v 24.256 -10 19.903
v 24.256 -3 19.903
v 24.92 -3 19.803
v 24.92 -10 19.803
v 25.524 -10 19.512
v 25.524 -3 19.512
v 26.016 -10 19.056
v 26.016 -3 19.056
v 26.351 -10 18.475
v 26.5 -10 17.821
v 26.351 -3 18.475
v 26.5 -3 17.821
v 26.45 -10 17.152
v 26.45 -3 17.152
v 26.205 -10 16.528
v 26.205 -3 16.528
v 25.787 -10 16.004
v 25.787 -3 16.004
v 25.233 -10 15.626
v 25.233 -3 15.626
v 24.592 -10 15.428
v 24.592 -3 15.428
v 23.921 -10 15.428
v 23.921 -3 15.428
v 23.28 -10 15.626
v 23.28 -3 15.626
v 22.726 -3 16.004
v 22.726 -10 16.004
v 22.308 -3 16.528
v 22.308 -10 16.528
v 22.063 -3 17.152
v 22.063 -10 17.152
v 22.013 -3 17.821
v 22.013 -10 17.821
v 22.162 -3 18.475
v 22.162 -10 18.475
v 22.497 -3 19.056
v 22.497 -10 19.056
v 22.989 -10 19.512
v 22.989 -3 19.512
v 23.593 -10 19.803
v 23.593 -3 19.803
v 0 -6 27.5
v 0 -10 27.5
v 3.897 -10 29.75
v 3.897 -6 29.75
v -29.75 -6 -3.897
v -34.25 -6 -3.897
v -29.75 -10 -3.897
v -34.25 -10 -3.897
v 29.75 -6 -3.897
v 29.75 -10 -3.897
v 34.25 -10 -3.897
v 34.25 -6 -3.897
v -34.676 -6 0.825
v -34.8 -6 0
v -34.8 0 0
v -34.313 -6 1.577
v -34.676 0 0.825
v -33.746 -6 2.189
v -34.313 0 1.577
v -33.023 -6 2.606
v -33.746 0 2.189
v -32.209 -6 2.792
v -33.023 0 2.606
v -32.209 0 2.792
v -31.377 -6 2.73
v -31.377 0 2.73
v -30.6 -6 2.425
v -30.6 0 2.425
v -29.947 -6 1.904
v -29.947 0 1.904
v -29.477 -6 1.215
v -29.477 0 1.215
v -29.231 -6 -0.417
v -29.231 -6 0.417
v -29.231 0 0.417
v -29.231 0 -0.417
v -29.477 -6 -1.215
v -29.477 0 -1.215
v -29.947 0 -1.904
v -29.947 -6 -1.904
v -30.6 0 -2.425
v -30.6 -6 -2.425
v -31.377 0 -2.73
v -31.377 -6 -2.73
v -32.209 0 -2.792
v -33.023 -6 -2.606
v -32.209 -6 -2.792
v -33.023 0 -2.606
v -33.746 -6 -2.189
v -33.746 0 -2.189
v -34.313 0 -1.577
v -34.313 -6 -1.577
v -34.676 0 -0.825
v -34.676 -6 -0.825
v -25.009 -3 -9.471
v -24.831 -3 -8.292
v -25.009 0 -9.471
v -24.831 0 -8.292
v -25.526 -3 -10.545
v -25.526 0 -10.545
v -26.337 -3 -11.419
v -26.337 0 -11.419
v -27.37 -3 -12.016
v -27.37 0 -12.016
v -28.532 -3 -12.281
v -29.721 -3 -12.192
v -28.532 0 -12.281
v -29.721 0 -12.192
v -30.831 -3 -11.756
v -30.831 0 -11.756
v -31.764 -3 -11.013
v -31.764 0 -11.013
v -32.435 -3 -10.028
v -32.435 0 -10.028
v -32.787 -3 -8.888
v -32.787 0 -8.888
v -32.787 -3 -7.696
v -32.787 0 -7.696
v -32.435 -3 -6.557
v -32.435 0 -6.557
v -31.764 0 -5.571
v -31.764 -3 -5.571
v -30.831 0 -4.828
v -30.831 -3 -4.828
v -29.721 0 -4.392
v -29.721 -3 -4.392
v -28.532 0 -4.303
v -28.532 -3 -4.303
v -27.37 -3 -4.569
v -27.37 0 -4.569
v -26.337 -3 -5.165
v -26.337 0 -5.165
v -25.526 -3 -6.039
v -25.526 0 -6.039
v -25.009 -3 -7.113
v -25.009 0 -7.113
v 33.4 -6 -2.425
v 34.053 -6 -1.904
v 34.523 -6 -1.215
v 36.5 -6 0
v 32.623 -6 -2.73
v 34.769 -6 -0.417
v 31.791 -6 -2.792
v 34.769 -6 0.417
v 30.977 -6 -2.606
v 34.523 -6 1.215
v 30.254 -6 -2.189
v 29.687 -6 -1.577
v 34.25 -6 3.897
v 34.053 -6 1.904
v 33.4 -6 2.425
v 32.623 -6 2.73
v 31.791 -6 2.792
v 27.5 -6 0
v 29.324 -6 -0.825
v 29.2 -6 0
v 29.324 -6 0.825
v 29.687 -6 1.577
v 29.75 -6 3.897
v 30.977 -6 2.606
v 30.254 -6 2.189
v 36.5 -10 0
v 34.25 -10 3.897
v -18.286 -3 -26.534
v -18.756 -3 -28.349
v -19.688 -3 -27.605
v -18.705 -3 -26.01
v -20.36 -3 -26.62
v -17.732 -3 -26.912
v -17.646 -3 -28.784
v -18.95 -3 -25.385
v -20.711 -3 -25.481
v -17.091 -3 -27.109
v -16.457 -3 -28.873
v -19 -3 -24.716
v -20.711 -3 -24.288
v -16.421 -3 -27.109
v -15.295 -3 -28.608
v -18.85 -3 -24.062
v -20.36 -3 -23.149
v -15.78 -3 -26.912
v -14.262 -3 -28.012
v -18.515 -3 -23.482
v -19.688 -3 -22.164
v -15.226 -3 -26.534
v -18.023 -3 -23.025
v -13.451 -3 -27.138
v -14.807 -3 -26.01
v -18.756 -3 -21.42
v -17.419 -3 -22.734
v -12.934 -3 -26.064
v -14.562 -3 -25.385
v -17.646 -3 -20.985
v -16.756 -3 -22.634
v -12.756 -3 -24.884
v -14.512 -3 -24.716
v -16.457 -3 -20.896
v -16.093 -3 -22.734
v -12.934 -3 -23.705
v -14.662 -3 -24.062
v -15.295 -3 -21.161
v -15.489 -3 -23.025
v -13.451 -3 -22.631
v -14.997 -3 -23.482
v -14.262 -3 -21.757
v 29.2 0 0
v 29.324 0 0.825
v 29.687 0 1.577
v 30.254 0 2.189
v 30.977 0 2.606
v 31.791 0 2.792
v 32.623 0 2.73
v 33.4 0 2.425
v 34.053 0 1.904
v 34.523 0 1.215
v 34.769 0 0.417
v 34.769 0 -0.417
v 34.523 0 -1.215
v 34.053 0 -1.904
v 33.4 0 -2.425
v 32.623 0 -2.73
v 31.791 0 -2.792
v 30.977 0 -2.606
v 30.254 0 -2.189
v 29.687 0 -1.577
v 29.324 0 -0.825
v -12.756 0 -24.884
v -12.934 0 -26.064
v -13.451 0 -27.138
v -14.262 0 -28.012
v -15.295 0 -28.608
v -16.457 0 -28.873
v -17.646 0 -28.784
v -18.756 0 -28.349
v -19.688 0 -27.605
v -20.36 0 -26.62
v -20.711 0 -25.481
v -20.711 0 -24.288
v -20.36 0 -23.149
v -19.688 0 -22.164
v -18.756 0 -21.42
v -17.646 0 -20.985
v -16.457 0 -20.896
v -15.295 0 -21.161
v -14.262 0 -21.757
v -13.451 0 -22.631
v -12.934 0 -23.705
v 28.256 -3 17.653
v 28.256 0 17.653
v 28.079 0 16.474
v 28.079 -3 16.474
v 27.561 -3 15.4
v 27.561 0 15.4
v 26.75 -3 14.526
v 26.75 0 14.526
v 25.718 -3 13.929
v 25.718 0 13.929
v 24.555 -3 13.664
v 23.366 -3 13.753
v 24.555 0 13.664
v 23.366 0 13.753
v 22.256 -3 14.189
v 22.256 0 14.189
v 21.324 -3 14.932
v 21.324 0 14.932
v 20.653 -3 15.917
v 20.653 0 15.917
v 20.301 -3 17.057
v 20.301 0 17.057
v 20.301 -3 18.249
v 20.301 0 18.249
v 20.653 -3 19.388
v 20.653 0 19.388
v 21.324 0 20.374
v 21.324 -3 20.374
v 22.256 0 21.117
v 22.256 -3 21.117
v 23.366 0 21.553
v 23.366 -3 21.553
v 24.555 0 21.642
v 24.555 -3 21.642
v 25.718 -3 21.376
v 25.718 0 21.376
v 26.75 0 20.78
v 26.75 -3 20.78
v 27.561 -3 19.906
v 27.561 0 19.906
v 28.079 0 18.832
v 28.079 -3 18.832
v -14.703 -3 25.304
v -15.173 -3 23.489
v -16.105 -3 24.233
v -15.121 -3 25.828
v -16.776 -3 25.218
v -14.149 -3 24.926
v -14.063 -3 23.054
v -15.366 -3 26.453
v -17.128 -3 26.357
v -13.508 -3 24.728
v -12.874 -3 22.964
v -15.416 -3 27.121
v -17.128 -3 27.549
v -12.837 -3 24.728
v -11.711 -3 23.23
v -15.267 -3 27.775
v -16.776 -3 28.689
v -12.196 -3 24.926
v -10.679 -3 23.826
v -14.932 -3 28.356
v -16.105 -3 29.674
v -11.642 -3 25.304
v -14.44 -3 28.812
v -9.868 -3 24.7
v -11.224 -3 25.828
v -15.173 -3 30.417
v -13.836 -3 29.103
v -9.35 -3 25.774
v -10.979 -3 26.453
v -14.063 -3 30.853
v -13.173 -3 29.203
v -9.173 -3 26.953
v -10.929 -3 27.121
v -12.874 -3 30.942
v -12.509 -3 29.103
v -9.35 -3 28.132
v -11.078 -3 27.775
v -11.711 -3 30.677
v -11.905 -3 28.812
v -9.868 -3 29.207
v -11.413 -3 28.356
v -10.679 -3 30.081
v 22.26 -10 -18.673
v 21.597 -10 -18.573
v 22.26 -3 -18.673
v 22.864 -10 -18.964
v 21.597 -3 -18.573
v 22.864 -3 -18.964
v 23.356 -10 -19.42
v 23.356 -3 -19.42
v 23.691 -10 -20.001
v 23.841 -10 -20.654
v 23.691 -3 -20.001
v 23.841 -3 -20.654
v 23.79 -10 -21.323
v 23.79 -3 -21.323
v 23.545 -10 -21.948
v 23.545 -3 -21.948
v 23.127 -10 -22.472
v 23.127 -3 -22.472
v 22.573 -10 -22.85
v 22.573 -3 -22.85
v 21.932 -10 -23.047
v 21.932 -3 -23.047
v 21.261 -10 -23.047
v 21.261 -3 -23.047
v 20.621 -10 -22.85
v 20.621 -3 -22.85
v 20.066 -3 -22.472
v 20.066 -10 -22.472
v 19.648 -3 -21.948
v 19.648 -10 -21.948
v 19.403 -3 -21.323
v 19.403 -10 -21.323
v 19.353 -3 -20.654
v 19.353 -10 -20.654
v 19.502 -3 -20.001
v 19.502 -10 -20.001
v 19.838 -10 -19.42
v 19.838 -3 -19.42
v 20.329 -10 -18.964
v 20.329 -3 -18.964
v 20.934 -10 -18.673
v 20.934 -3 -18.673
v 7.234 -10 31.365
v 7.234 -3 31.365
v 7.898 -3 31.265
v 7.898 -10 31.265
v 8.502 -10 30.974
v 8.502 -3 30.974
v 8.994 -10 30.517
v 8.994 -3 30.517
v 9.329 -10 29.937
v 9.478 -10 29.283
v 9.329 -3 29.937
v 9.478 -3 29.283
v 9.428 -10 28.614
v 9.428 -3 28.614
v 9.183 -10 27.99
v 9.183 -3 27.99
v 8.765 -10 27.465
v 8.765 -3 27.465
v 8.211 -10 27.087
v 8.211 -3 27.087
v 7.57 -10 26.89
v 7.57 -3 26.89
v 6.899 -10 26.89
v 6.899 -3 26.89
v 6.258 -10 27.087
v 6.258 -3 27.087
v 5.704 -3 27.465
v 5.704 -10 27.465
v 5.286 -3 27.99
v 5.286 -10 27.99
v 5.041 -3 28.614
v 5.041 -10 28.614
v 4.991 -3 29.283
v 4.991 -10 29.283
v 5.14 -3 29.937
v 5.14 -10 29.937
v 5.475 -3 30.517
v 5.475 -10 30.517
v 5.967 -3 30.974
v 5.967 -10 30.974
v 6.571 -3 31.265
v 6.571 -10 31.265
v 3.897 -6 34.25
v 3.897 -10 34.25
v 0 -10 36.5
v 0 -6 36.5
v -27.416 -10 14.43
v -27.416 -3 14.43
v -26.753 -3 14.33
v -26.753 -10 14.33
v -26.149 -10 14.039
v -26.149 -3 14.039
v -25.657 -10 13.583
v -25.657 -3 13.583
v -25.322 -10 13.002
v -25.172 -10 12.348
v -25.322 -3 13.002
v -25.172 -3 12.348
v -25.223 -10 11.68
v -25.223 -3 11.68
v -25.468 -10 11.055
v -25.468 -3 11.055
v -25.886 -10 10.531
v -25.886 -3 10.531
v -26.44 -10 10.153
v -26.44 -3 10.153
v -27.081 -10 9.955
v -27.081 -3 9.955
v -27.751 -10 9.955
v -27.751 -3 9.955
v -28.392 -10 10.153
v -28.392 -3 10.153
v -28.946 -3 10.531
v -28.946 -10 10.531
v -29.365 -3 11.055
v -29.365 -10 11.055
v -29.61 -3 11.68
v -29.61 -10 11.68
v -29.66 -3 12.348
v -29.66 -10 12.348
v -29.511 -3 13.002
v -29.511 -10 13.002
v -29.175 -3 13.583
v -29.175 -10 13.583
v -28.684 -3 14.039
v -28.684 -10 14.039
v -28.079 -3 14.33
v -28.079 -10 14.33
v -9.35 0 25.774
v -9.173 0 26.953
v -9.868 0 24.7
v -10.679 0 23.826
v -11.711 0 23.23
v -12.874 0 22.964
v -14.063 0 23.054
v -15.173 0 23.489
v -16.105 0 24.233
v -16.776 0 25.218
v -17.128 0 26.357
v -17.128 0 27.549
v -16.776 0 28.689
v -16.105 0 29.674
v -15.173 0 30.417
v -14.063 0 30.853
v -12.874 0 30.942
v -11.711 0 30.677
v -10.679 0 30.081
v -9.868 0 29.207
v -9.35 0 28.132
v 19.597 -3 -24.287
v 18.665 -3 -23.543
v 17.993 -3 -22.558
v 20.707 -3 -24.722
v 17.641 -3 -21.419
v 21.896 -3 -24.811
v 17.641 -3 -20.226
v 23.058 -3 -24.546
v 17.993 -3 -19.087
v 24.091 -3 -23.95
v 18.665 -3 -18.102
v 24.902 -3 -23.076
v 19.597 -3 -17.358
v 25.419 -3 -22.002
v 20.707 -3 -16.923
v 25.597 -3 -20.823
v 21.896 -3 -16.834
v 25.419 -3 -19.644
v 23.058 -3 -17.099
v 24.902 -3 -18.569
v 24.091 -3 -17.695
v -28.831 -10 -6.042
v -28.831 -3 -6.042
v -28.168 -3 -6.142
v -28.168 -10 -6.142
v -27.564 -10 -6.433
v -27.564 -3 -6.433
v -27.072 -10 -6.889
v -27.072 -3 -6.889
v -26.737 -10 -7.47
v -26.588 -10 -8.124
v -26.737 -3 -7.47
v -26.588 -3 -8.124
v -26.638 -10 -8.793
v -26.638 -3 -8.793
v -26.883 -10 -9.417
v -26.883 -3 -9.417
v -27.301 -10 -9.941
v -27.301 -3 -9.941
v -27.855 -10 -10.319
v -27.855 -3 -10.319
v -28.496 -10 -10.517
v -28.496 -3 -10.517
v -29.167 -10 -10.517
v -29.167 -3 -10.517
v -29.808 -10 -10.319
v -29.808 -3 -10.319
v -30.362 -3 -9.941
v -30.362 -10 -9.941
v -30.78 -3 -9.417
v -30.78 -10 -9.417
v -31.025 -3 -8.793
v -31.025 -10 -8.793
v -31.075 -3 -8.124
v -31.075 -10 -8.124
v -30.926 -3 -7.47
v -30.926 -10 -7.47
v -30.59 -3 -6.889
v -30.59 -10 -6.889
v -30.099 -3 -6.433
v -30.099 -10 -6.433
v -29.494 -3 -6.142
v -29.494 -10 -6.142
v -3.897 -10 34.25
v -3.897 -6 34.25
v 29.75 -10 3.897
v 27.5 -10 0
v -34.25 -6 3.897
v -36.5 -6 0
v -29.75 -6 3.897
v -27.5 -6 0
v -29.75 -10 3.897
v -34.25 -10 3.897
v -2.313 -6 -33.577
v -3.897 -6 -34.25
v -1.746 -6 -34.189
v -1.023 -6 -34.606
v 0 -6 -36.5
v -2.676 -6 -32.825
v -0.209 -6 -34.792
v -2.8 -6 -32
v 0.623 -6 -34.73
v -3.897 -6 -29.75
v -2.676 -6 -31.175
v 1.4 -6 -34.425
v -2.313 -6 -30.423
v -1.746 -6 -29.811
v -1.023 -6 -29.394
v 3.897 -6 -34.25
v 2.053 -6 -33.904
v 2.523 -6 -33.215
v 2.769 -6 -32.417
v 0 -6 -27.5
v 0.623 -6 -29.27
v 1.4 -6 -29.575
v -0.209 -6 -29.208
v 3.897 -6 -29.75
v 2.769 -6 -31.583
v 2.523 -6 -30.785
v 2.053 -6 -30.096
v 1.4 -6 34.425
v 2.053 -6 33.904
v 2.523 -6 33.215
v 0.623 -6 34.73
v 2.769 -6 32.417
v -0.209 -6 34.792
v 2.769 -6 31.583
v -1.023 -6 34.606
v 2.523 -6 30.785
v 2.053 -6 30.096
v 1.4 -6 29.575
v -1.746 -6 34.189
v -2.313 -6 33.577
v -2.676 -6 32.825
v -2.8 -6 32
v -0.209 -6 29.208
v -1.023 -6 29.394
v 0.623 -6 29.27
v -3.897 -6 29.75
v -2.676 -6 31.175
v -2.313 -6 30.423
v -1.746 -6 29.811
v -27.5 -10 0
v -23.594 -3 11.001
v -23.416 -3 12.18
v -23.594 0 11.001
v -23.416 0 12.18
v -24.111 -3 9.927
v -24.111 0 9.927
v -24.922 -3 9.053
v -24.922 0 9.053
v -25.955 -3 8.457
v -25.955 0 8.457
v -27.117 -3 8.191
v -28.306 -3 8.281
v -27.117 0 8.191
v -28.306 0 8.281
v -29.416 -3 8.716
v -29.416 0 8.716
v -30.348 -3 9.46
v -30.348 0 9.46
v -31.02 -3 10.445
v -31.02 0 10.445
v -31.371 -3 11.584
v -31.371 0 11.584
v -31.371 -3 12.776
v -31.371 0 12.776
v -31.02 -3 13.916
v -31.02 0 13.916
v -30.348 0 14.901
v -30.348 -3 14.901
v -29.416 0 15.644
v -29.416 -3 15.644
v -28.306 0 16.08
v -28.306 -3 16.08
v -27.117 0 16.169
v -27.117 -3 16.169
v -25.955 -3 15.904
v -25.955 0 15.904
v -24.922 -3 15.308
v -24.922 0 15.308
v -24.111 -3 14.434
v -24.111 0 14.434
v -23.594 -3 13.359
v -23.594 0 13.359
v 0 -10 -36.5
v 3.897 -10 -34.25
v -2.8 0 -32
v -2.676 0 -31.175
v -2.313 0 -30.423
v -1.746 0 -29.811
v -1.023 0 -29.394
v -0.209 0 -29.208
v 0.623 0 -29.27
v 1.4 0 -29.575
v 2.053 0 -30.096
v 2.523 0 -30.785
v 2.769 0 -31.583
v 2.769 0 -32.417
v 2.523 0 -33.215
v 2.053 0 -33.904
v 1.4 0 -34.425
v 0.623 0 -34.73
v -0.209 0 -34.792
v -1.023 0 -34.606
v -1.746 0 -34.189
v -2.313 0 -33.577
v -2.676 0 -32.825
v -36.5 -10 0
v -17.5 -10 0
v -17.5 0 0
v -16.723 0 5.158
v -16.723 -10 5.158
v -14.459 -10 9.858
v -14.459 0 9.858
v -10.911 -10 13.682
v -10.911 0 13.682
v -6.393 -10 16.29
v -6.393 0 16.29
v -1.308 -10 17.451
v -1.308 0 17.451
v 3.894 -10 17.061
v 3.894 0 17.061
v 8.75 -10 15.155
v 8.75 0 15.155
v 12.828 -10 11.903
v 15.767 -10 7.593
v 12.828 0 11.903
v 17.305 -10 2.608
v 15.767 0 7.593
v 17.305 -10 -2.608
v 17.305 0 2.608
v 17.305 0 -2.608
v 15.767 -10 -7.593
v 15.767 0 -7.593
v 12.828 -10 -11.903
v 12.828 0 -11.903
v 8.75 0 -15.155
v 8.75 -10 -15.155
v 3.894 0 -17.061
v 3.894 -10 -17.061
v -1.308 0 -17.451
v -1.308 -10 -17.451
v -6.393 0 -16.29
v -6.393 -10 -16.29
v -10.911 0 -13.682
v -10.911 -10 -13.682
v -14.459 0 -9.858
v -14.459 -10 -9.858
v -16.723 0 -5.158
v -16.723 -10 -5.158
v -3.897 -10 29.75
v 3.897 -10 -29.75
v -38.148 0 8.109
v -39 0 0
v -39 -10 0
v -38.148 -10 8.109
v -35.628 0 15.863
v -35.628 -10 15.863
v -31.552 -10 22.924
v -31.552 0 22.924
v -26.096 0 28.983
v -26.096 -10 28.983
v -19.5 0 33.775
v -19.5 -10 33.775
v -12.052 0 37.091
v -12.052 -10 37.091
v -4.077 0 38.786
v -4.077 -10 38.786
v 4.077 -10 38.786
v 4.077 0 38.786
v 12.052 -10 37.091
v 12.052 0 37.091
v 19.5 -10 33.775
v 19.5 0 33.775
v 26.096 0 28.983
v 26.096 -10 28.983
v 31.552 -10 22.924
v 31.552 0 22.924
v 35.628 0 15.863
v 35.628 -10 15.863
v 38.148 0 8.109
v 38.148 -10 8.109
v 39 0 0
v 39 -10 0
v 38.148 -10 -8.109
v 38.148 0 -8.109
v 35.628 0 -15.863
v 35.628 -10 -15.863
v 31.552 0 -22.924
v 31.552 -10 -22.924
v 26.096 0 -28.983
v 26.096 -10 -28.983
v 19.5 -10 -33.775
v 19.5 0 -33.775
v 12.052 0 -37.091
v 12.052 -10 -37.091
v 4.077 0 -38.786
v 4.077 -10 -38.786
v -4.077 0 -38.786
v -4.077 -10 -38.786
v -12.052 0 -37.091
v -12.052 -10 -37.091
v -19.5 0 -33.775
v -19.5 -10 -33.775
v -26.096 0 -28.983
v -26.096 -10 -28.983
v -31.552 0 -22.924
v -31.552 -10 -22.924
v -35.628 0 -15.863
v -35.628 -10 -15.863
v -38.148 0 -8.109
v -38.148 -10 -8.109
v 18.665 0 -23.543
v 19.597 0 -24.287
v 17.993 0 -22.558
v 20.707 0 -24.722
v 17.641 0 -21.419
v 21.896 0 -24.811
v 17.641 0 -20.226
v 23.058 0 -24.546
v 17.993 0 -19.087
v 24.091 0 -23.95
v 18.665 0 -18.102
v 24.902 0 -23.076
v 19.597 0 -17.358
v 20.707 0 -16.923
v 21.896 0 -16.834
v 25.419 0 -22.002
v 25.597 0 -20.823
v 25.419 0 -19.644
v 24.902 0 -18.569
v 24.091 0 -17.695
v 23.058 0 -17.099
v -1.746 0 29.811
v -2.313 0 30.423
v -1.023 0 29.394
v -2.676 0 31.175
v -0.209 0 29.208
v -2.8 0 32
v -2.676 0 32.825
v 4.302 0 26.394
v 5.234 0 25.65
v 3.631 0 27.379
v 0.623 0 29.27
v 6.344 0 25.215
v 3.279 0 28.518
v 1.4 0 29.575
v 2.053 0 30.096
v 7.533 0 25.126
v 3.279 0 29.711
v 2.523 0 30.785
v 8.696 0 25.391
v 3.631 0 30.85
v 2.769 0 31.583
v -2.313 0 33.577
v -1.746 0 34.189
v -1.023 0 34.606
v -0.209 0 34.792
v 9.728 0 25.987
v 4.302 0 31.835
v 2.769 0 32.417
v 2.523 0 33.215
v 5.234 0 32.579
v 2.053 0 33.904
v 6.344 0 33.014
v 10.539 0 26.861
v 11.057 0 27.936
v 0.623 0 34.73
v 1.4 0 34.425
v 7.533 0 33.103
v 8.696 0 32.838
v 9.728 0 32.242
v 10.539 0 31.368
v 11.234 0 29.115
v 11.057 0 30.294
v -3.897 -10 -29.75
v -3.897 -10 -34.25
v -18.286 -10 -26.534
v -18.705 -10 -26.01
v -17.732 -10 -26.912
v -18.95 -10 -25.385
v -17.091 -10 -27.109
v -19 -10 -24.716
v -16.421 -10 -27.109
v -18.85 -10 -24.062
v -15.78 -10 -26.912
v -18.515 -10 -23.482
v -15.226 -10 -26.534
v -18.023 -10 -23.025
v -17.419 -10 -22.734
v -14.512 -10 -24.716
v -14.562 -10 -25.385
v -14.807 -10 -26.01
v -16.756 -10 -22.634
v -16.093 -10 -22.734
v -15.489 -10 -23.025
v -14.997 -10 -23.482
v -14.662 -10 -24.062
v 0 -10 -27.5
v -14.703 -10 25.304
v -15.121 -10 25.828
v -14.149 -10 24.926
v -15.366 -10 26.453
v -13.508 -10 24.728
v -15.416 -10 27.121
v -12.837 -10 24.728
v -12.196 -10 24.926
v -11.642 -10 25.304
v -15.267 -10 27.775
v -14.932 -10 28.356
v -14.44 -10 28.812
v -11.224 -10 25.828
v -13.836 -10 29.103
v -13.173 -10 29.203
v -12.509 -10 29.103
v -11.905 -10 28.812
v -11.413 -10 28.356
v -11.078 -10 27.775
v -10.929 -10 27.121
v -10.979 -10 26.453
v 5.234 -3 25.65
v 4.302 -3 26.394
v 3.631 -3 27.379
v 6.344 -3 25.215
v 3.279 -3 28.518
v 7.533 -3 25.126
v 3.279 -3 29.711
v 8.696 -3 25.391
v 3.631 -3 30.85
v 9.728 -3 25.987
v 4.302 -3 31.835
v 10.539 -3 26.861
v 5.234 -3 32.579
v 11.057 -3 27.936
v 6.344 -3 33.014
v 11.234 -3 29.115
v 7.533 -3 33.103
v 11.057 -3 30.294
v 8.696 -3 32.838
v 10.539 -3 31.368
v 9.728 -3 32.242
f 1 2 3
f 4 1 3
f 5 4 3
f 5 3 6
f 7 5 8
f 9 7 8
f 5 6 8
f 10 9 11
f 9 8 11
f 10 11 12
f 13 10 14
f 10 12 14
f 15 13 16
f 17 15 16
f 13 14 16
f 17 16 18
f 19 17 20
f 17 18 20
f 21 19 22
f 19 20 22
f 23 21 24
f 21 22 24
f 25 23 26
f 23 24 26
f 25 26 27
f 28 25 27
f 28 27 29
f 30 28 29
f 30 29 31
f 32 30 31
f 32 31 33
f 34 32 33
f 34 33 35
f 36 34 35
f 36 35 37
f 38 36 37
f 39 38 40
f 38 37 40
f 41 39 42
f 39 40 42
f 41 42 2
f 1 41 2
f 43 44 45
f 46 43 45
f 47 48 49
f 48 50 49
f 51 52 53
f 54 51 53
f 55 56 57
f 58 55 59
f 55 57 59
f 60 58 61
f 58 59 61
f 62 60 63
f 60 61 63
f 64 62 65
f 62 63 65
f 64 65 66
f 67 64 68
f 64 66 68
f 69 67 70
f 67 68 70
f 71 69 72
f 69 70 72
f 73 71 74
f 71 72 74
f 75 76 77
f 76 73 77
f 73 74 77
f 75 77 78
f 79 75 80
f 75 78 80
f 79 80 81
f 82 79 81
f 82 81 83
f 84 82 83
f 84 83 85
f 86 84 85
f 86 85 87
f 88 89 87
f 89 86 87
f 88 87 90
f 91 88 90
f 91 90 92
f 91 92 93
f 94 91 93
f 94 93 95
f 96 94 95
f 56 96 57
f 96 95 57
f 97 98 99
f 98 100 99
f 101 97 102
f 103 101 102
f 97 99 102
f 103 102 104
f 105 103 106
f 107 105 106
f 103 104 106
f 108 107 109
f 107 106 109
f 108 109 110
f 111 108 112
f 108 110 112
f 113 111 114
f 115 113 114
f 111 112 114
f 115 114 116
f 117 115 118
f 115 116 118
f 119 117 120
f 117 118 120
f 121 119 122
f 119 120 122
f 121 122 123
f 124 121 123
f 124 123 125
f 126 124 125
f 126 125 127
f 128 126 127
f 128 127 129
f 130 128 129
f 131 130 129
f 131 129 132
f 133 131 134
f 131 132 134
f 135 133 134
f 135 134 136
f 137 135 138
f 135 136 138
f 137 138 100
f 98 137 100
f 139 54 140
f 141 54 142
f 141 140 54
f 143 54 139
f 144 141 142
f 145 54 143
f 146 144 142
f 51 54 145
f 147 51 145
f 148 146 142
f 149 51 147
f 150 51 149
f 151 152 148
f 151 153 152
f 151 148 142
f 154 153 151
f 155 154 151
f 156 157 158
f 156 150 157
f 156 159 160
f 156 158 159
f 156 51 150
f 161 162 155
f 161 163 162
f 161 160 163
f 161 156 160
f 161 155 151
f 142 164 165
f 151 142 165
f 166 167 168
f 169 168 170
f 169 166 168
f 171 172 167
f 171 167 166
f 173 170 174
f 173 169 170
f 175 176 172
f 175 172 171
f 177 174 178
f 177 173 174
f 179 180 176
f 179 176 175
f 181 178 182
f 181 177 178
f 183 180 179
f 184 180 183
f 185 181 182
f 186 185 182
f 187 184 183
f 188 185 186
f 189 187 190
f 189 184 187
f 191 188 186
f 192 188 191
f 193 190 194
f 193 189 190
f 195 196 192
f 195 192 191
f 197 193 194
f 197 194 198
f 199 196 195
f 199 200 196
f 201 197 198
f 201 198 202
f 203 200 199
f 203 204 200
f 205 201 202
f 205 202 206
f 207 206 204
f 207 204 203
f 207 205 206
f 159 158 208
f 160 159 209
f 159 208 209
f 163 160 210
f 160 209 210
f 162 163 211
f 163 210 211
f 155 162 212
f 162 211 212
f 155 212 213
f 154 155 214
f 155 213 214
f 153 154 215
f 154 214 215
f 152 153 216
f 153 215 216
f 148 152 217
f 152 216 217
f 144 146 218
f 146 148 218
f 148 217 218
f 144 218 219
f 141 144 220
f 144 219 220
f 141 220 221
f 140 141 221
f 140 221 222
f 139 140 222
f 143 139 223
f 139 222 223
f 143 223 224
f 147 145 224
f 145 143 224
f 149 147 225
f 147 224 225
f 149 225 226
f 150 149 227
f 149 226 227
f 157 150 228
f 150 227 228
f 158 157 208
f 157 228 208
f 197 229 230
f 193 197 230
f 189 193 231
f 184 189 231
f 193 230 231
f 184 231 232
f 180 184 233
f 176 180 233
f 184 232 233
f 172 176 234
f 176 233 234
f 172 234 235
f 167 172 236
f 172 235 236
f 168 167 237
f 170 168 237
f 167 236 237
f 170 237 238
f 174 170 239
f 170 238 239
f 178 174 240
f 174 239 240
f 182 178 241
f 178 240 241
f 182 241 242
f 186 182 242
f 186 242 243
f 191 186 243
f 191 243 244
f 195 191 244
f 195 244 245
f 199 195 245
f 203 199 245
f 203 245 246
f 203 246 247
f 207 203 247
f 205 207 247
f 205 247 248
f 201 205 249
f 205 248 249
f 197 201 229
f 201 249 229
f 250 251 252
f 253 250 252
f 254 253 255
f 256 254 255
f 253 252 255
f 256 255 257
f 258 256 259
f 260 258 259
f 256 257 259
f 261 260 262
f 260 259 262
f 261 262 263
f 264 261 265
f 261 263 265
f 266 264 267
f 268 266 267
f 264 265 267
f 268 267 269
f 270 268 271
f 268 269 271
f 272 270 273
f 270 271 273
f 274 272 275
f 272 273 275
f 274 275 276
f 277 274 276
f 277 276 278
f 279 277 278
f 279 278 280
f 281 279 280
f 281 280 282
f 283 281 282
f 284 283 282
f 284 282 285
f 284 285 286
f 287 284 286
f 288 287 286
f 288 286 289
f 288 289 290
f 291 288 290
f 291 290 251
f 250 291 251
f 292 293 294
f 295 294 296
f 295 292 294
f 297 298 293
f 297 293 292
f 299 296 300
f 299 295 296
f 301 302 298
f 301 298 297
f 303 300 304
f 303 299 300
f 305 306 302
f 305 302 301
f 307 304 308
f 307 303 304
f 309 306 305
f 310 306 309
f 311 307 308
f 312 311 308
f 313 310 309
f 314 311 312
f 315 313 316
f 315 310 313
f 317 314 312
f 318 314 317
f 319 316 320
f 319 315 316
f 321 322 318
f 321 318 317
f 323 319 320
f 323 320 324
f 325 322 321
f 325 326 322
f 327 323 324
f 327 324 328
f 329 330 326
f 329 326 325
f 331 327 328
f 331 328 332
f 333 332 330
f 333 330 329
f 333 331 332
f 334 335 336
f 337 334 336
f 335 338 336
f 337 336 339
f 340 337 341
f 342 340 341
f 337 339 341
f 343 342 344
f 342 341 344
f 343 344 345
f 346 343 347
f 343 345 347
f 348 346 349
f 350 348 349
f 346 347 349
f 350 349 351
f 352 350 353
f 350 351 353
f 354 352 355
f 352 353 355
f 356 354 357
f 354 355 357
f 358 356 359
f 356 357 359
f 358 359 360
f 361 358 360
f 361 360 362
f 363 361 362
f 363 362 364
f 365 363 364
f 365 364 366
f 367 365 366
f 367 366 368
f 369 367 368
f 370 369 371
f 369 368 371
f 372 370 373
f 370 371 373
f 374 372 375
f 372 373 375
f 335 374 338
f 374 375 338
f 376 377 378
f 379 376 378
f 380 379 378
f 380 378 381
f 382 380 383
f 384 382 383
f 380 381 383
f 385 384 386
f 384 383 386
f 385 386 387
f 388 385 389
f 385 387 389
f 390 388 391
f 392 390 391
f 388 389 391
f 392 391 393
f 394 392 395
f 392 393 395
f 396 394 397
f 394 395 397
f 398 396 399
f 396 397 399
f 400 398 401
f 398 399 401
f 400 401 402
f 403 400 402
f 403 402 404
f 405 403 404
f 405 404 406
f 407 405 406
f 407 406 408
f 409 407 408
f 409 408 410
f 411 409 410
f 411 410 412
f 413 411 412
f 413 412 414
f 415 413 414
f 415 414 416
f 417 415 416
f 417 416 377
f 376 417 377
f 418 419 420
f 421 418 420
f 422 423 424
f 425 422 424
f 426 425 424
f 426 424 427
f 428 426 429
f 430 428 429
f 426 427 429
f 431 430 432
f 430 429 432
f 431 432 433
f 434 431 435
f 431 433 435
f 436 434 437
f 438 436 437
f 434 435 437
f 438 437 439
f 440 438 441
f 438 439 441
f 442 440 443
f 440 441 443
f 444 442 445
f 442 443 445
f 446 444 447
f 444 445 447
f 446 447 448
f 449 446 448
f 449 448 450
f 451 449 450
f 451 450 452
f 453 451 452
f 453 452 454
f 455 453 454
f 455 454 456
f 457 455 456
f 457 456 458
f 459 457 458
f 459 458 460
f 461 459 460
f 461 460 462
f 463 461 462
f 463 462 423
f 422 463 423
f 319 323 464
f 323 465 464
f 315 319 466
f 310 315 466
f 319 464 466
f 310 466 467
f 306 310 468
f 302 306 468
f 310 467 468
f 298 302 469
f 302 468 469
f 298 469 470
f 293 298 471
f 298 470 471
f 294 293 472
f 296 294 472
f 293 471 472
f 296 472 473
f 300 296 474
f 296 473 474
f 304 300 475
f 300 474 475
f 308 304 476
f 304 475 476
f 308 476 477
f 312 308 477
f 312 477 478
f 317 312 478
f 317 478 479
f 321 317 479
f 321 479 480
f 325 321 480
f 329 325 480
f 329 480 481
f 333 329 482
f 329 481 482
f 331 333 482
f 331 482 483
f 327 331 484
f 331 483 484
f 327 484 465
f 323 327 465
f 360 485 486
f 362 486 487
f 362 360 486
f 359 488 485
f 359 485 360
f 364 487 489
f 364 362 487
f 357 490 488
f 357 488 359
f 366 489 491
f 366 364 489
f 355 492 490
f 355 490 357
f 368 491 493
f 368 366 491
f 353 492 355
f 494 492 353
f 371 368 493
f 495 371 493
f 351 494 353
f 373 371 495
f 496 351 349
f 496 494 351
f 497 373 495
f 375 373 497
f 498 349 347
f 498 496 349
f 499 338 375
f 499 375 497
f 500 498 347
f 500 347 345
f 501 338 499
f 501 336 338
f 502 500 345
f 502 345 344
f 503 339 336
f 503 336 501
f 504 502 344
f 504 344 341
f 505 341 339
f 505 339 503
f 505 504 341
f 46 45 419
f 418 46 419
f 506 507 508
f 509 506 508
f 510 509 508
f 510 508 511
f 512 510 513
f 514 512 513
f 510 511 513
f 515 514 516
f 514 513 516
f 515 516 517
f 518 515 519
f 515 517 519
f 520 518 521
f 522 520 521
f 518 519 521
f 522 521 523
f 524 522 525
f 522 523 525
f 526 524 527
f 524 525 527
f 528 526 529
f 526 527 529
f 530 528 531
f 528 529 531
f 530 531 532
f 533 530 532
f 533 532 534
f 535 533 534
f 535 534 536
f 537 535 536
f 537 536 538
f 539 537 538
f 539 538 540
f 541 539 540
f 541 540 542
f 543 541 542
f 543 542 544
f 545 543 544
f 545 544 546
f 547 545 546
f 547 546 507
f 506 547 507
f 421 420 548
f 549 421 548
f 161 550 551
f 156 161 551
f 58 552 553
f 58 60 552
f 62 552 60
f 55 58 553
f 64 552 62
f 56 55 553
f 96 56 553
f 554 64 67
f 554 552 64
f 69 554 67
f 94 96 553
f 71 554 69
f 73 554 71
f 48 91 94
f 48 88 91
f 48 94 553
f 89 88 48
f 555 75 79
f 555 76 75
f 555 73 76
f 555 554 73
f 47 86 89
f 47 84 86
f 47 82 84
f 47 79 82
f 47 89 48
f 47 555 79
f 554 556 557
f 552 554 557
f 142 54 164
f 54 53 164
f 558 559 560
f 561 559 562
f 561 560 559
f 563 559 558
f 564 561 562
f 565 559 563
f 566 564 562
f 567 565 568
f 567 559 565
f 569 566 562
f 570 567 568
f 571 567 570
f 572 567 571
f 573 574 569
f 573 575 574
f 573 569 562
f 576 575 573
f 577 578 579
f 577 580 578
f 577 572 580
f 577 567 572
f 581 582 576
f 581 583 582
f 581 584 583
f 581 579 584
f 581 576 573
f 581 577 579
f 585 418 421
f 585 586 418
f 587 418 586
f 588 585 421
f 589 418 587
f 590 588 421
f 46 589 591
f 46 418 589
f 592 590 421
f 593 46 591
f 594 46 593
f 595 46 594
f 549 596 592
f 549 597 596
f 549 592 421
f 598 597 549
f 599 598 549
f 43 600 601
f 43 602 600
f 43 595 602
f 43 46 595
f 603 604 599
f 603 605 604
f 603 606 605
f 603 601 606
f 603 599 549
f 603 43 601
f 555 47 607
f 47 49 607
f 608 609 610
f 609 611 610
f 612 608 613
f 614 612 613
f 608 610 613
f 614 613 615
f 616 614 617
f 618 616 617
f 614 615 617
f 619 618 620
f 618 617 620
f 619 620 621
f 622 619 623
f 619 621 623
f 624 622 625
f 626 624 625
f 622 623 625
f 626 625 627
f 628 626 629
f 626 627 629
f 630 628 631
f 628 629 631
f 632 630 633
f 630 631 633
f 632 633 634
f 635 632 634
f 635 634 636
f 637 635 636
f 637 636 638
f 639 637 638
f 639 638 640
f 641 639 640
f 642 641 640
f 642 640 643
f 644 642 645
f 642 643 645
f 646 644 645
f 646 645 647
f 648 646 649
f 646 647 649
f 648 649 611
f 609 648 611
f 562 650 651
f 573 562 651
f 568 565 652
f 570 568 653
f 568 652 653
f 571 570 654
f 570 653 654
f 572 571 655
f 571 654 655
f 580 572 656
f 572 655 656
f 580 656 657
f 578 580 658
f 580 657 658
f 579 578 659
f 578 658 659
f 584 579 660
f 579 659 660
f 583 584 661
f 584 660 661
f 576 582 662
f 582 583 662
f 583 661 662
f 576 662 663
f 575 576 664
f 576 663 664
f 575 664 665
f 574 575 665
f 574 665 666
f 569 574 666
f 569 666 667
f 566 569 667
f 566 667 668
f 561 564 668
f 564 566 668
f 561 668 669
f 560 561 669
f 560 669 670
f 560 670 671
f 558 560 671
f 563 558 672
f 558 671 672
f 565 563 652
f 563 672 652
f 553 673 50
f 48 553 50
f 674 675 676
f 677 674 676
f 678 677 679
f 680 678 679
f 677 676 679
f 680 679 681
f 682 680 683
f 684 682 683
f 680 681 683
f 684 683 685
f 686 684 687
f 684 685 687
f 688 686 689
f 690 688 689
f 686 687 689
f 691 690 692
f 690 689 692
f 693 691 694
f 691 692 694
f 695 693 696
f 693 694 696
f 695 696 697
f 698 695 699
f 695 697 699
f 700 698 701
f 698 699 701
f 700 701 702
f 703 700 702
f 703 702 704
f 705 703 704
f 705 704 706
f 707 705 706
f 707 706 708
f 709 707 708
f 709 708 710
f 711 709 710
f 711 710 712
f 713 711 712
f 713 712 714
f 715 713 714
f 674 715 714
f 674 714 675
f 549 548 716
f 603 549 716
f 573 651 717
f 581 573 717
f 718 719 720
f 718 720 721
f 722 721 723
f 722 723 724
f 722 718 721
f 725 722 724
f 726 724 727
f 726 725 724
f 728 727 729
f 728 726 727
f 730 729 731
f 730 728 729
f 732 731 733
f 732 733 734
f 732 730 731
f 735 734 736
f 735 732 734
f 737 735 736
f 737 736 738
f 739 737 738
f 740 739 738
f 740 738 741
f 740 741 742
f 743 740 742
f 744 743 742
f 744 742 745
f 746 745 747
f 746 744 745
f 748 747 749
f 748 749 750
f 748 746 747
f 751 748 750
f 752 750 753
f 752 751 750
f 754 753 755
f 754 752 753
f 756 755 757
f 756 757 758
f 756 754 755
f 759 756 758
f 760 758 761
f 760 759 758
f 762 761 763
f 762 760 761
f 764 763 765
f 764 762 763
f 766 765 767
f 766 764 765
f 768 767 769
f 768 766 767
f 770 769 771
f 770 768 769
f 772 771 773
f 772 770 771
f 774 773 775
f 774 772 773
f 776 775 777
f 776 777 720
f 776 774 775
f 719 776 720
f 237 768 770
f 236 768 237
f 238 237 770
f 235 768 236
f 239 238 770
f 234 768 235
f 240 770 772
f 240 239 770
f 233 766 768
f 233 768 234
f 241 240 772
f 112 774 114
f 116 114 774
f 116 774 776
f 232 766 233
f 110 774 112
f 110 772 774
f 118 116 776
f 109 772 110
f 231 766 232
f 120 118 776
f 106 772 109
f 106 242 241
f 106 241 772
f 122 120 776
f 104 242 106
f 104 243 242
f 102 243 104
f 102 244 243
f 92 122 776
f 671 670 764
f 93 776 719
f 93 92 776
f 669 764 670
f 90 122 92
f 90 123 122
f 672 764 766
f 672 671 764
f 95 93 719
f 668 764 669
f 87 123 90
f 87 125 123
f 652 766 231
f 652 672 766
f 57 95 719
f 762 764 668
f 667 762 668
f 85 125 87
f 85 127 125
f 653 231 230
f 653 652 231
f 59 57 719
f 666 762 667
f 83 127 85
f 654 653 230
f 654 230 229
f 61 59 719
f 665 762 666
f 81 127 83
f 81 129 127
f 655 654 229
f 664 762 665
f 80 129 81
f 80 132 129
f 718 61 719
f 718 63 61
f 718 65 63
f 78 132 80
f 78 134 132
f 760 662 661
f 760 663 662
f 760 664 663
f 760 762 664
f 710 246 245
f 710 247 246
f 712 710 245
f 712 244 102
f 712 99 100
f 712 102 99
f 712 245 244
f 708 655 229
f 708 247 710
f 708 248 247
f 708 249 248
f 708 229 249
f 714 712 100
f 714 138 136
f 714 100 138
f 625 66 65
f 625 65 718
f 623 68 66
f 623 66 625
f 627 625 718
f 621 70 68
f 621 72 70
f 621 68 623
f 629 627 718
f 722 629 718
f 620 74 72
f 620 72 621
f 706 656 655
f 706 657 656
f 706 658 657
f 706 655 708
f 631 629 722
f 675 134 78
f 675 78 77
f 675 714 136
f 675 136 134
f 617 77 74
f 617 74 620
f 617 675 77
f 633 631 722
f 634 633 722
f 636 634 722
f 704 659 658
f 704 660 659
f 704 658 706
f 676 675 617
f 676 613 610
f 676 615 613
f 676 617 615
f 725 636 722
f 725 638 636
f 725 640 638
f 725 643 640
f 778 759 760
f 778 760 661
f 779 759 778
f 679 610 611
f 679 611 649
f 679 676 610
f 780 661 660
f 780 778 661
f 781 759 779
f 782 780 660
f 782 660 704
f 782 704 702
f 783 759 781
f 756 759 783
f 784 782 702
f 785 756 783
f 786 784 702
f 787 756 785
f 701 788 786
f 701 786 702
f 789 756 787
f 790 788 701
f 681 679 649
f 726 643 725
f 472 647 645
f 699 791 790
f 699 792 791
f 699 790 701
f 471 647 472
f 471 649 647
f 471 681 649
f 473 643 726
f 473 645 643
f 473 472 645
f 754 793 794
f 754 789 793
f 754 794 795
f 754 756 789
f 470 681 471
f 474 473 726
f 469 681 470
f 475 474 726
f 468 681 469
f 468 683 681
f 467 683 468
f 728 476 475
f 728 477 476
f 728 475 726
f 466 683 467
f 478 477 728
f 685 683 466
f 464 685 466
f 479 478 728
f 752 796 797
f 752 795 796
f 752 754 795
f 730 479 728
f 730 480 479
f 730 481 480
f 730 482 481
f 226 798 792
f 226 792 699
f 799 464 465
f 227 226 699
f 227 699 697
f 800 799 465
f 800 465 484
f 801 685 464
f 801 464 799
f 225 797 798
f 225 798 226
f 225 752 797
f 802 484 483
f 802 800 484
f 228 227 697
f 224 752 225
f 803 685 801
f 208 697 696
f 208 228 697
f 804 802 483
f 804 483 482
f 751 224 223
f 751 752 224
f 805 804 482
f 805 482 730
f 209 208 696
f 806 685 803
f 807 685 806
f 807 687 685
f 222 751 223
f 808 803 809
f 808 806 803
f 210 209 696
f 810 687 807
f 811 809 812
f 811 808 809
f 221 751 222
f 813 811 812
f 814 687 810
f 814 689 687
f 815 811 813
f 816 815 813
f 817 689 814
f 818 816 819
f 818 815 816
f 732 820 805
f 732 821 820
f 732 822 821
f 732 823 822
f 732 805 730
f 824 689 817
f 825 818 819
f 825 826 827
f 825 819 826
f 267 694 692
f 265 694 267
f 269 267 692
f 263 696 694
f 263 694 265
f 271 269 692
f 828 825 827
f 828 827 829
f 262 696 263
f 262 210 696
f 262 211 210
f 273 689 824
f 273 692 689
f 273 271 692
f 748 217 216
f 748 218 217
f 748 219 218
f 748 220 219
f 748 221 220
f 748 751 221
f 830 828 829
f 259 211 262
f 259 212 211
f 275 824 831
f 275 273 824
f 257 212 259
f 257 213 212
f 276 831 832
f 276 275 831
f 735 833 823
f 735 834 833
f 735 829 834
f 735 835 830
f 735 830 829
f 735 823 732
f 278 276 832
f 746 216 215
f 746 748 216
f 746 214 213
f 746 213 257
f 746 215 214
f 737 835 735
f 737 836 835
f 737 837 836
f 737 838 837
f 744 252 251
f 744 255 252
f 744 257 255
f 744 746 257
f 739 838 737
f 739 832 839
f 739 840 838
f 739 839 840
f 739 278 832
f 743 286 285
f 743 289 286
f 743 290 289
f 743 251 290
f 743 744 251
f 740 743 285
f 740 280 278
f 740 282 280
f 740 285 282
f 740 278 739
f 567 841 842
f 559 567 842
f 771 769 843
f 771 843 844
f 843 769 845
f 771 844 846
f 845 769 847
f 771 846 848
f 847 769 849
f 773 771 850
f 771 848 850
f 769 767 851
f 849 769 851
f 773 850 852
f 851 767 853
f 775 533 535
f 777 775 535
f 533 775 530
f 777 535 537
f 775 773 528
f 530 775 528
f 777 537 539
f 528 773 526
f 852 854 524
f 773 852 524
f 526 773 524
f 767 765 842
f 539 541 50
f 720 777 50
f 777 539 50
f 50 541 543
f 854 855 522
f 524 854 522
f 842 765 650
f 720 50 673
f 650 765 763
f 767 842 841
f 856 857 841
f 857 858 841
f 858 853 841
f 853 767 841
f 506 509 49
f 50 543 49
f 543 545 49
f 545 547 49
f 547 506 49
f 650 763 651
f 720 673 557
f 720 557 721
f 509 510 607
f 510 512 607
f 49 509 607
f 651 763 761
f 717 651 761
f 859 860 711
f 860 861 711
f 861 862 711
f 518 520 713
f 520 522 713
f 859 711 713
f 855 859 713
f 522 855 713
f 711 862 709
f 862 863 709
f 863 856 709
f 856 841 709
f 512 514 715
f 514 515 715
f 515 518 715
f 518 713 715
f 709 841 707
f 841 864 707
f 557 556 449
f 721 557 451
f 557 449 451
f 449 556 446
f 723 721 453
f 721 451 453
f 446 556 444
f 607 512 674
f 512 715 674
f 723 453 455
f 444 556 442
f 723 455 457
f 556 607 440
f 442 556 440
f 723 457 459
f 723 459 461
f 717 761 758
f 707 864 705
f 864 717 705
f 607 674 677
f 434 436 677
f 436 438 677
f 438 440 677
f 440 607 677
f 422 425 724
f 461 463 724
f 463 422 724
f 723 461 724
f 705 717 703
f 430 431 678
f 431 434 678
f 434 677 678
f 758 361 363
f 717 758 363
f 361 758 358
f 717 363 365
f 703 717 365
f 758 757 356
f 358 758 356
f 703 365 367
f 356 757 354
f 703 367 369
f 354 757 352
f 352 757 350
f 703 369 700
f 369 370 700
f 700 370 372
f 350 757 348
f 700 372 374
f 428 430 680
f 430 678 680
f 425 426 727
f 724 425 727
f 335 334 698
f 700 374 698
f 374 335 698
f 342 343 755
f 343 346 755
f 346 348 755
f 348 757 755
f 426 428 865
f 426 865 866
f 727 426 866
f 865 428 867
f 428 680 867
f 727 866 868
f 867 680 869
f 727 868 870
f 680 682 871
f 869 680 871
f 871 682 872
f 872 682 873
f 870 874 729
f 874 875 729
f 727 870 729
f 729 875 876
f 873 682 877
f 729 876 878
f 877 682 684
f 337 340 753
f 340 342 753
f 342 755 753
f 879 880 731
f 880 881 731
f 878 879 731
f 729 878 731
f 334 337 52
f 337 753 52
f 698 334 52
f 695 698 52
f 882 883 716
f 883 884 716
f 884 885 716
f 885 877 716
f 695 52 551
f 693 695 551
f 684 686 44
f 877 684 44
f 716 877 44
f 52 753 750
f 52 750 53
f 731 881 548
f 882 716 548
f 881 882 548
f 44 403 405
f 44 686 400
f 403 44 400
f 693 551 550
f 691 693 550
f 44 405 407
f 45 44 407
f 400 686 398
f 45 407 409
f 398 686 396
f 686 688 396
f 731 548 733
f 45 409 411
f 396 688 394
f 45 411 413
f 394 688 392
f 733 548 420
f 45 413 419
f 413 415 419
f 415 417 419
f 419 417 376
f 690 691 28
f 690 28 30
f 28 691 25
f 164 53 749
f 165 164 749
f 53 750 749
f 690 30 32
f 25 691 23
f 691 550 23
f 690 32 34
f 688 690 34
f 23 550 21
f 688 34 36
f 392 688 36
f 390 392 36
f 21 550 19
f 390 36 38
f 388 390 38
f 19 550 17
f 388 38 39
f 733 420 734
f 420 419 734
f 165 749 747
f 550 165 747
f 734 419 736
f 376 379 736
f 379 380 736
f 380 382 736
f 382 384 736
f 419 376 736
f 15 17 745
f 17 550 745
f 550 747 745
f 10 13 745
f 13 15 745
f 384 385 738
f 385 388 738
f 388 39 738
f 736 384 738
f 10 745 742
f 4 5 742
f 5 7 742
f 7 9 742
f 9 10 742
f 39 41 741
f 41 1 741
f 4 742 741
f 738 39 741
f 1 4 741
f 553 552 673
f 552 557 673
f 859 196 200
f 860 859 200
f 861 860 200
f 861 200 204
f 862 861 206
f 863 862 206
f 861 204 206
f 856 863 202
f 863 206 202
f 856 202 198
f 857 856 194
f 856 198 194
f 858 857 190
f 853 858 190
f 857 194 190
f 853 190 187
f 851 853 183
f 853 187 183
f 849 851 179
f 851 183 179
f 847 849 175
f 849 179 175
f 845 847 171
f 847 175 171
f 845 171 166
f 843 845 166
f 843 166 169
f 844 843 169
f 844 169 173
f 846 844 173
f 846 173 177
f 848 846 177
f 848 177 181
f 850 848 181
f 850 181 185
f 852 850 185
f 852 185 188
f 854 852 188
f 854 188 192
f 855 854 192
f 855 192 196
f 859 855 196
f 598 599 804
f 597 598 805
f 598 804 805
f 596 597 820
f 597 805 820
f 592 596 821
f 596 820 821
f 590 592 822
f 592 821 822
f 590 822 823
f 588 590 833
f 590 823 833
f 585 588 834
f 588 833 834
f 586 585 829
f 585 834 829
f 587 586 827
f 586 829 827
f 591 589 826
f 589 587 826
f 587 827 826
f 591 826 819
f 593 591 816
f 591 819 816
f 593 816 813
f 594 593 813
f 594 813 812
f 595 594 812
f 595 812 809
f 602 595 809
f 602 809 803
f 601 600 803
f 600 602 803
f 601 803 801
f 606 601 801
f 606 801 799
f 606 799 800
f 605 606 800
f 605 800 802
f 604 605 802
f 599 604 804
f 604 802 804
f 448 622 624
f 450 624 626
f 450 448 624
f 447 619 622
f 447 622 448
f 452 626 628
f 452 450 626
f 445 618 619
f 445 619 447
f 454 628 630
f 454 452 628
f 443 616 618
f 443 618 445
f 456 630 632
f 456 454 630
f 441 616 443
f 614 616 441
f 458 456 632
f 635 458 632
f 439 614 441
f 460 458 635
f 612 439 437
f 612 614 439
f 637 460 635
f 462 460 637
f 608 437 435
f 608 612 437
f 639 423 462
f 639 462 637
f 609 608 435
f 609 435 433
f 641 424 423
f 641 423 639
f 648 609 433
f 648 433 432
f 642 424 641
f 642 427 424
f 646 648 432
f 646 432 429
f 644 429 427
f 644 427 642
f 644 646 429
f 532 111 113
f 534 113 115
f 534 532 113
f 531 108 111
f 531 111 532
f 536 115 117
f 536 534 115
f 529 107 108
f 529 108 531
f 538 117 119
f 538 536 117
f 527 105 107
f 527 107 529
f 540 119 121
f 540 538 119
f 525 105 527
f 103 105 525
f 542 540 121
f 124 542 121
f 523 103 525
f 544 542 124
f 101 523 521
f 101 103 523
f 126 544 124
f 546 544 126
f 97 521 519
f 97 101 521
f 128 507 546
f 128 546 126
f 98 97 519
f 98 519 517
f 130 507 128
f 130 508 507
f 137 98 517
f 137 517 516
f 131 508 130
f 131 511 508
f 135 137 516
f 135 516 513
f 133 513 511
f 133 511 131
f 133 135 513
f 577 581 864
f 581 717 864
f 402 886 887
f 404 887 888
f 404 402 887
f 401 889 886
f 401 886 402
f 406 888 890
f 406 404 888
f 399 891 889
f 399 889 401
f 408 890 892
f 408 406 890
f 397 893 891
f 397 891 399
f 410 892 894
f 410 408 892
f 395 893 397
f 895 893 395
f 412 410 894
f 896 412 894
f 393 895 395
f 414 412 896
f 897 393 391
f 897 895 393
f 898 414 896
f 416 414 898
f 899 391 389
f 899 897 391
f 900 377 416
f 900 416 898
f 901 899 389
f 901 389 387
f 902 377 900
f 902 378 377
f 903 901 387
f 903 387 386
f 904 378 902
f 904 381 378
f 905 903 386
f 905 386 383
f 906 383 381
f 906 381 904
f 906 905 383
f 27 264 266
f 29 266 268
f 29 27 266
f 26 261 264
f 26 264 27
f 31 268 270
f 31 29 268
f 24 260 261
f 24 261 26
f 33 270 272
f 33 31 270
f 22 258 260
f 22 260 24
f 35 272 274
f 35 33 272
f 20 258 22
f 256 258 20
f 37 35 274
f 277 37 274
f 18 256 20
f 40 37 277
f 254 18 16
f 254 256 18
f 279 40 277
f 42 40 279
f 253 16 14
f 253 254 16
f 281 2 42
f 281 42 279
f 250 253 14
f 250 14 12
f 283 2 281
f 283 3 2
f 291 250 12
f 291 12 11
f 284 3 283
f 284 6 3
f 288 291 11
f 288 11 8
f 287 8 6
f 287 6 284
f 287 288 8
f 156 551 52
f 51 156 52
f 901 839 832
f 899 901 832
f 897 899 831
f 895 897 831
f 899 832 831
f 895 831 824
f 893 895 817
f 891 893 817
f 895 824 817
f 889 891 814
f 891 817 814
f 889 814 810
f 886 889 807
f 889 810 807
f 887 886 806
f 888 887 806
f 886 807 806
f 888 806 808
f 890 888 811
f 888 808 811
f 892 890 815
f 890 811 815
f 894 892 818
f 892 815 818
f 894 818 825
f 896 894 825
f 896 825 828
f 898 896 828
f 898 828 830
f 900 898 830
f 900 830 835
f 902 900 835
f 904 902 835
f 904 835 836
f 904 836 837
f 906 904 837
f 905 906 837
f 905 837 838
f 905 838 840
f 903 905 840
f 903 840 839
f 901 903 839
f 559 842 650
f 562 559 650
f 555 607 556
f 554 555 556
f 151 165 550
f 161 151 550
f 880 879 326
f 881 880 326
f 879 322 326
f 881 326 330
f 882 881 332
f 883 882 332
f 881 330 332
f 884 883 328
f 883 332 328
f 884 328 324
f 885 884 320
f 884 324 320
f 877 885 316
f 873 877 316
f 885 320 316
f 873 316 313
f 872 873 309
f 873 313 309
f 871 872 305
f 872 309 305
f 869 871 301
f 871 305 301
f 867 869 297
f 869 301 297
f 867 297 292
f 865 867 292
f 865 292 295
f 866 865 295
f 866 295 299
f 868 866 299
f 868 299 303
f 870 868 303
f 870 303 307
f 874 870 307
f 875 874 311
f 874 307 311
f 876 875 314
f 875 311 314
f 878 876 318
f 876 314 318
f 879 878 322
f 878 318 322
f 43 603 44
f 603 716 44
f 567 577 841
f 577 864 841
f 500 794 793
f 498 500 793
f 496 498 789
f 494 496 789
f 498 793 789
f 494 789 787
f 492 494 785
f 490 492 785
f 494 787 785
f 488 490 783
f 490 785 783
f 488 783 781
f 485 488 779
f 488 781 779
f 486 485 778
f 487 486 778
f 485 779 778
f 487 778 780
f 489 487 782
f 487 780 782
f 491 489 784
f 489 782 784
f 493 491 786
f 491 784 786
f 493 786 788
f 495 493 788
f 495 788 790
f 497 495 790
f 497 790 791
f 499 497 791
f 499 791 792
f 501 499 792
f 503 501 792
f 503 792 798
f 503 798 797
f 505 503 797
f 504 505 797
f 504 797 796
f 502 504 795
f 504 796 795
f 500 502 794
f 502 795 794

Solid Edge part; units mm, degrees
sketch "Sketch1" plane through (0, 0, 0) normal (0, 1, 0) x (-1, 0, 0)
  circle A0 centre (0, 0) radius 17.5
  circle A1 centre (0, 0) radius 39
  dimension "D1" = 64
  dimension "D2" = 78
  dimension "D3" = 35
  dimension "D4" = 5.6
extrude "Protrusion1" add sketch "Sketch1" against normal blind 10
sketch "Sketch2" plane through (0, 0, 0) normal (0, 1, 0) x (0, 0, 1)
  circle A0 centre (-20.8226, 21.5968) radius 2.25
  circle A1 centre (17.6529, 24.2565) radius 2.25
  circle A2 centre (29.1146, 7.2345) radius 2.25
  circle A3 centre (26.9533, -13.1726) radius 2.25
  circle A4 centre (12.1803, -27.4161) radius 2.25
  circle A5 centre (-8.2921, -28.8313) radius 2.25
  circle A6 centre (-24.8845, -16.756) radius 2.25
  dimension "D1" = 25
  dimension "D2" = 60
  dimension "D3" = 4.5
extrude "ExtrudedCutout_1" cut sketch "Sketch2" against normal blind 130.6
sketch "Sketch3" plane through (0, 0, 0) normal (0, 1, 0) x (-1, 0, 0)
  circle A0 centre (0, 32) radius 2.8
  circle A1 centre (-32, 0) radius 2.8
  circle A2 centre (0, -32) radius 2.8
  circle A3 centre (32, 0) radius 2.8
  dimension "D1" = 64
  dimension "D2" = 78
  dimension "D3" = 35
  dimension "D4" = 5.6
extrude "ExtrudedCutout_2" cut sketch "Sketch3" against normal blind 261.7
sketch "Sketch4" plane through (0, -10, 0) normal (0, -1, 0) x (0, 0, 1)
  circle A0 centre (0, 32) radius 2.8
  line L0 (0, 36.5) -> (-3.8971, 34.25)
  line L1 (-3.8971, 34.25) -> (-3.8971, 29.75)
  line L2 (-3.8971, 29.75) -> (0, 27.5)
  line L3 (0, 27.5) -> (3.8971, 29.75)
  line L4 (3.8971, 29.75) -> (3.8971, 34.25)
  line L5 (3.8971, 34.25) -> (0, 36.5)
extrude "ExtrudedCutout_3" cut sketch "Sketch4" against normal blind 4
pattern_circular "Pattern1" count 4 over 360 about axis through (0, -10, 0) along (0, -1, 0) of "ExtrudedCutout_3"
sketch "Sketch5" plane through (0, 0, 0) normal (0, 1, 0) x (1, 0, 0)
  circle A0 centre (-16.756, 24.8845) radius 4
  circle A1 centre (21.5968, 20.8226) radius 4
  circle A2 centre (24.2565, -17.6529) radius 4
  circle A3 centre (7.2345, -29.1146) radius 4
  circle A4 centre (-13.1726, -26.9533) radius 4
  circle A5 centre (-27.4161, -12.1803) radius 4
  circle A6 centre (-28.8313, 8.2921) radius 4
  dimension "D1" = 8
  dimension "D2" = 8
  dimension "D3" = 8
  dimension "D4" = 8
  dimension "D5" = 8
  dimension "D6" = 8
  dimension "D7" = 8
extrude "ExtrudedCutout_4" cut sketch "Sketch5" against normal blind 3
